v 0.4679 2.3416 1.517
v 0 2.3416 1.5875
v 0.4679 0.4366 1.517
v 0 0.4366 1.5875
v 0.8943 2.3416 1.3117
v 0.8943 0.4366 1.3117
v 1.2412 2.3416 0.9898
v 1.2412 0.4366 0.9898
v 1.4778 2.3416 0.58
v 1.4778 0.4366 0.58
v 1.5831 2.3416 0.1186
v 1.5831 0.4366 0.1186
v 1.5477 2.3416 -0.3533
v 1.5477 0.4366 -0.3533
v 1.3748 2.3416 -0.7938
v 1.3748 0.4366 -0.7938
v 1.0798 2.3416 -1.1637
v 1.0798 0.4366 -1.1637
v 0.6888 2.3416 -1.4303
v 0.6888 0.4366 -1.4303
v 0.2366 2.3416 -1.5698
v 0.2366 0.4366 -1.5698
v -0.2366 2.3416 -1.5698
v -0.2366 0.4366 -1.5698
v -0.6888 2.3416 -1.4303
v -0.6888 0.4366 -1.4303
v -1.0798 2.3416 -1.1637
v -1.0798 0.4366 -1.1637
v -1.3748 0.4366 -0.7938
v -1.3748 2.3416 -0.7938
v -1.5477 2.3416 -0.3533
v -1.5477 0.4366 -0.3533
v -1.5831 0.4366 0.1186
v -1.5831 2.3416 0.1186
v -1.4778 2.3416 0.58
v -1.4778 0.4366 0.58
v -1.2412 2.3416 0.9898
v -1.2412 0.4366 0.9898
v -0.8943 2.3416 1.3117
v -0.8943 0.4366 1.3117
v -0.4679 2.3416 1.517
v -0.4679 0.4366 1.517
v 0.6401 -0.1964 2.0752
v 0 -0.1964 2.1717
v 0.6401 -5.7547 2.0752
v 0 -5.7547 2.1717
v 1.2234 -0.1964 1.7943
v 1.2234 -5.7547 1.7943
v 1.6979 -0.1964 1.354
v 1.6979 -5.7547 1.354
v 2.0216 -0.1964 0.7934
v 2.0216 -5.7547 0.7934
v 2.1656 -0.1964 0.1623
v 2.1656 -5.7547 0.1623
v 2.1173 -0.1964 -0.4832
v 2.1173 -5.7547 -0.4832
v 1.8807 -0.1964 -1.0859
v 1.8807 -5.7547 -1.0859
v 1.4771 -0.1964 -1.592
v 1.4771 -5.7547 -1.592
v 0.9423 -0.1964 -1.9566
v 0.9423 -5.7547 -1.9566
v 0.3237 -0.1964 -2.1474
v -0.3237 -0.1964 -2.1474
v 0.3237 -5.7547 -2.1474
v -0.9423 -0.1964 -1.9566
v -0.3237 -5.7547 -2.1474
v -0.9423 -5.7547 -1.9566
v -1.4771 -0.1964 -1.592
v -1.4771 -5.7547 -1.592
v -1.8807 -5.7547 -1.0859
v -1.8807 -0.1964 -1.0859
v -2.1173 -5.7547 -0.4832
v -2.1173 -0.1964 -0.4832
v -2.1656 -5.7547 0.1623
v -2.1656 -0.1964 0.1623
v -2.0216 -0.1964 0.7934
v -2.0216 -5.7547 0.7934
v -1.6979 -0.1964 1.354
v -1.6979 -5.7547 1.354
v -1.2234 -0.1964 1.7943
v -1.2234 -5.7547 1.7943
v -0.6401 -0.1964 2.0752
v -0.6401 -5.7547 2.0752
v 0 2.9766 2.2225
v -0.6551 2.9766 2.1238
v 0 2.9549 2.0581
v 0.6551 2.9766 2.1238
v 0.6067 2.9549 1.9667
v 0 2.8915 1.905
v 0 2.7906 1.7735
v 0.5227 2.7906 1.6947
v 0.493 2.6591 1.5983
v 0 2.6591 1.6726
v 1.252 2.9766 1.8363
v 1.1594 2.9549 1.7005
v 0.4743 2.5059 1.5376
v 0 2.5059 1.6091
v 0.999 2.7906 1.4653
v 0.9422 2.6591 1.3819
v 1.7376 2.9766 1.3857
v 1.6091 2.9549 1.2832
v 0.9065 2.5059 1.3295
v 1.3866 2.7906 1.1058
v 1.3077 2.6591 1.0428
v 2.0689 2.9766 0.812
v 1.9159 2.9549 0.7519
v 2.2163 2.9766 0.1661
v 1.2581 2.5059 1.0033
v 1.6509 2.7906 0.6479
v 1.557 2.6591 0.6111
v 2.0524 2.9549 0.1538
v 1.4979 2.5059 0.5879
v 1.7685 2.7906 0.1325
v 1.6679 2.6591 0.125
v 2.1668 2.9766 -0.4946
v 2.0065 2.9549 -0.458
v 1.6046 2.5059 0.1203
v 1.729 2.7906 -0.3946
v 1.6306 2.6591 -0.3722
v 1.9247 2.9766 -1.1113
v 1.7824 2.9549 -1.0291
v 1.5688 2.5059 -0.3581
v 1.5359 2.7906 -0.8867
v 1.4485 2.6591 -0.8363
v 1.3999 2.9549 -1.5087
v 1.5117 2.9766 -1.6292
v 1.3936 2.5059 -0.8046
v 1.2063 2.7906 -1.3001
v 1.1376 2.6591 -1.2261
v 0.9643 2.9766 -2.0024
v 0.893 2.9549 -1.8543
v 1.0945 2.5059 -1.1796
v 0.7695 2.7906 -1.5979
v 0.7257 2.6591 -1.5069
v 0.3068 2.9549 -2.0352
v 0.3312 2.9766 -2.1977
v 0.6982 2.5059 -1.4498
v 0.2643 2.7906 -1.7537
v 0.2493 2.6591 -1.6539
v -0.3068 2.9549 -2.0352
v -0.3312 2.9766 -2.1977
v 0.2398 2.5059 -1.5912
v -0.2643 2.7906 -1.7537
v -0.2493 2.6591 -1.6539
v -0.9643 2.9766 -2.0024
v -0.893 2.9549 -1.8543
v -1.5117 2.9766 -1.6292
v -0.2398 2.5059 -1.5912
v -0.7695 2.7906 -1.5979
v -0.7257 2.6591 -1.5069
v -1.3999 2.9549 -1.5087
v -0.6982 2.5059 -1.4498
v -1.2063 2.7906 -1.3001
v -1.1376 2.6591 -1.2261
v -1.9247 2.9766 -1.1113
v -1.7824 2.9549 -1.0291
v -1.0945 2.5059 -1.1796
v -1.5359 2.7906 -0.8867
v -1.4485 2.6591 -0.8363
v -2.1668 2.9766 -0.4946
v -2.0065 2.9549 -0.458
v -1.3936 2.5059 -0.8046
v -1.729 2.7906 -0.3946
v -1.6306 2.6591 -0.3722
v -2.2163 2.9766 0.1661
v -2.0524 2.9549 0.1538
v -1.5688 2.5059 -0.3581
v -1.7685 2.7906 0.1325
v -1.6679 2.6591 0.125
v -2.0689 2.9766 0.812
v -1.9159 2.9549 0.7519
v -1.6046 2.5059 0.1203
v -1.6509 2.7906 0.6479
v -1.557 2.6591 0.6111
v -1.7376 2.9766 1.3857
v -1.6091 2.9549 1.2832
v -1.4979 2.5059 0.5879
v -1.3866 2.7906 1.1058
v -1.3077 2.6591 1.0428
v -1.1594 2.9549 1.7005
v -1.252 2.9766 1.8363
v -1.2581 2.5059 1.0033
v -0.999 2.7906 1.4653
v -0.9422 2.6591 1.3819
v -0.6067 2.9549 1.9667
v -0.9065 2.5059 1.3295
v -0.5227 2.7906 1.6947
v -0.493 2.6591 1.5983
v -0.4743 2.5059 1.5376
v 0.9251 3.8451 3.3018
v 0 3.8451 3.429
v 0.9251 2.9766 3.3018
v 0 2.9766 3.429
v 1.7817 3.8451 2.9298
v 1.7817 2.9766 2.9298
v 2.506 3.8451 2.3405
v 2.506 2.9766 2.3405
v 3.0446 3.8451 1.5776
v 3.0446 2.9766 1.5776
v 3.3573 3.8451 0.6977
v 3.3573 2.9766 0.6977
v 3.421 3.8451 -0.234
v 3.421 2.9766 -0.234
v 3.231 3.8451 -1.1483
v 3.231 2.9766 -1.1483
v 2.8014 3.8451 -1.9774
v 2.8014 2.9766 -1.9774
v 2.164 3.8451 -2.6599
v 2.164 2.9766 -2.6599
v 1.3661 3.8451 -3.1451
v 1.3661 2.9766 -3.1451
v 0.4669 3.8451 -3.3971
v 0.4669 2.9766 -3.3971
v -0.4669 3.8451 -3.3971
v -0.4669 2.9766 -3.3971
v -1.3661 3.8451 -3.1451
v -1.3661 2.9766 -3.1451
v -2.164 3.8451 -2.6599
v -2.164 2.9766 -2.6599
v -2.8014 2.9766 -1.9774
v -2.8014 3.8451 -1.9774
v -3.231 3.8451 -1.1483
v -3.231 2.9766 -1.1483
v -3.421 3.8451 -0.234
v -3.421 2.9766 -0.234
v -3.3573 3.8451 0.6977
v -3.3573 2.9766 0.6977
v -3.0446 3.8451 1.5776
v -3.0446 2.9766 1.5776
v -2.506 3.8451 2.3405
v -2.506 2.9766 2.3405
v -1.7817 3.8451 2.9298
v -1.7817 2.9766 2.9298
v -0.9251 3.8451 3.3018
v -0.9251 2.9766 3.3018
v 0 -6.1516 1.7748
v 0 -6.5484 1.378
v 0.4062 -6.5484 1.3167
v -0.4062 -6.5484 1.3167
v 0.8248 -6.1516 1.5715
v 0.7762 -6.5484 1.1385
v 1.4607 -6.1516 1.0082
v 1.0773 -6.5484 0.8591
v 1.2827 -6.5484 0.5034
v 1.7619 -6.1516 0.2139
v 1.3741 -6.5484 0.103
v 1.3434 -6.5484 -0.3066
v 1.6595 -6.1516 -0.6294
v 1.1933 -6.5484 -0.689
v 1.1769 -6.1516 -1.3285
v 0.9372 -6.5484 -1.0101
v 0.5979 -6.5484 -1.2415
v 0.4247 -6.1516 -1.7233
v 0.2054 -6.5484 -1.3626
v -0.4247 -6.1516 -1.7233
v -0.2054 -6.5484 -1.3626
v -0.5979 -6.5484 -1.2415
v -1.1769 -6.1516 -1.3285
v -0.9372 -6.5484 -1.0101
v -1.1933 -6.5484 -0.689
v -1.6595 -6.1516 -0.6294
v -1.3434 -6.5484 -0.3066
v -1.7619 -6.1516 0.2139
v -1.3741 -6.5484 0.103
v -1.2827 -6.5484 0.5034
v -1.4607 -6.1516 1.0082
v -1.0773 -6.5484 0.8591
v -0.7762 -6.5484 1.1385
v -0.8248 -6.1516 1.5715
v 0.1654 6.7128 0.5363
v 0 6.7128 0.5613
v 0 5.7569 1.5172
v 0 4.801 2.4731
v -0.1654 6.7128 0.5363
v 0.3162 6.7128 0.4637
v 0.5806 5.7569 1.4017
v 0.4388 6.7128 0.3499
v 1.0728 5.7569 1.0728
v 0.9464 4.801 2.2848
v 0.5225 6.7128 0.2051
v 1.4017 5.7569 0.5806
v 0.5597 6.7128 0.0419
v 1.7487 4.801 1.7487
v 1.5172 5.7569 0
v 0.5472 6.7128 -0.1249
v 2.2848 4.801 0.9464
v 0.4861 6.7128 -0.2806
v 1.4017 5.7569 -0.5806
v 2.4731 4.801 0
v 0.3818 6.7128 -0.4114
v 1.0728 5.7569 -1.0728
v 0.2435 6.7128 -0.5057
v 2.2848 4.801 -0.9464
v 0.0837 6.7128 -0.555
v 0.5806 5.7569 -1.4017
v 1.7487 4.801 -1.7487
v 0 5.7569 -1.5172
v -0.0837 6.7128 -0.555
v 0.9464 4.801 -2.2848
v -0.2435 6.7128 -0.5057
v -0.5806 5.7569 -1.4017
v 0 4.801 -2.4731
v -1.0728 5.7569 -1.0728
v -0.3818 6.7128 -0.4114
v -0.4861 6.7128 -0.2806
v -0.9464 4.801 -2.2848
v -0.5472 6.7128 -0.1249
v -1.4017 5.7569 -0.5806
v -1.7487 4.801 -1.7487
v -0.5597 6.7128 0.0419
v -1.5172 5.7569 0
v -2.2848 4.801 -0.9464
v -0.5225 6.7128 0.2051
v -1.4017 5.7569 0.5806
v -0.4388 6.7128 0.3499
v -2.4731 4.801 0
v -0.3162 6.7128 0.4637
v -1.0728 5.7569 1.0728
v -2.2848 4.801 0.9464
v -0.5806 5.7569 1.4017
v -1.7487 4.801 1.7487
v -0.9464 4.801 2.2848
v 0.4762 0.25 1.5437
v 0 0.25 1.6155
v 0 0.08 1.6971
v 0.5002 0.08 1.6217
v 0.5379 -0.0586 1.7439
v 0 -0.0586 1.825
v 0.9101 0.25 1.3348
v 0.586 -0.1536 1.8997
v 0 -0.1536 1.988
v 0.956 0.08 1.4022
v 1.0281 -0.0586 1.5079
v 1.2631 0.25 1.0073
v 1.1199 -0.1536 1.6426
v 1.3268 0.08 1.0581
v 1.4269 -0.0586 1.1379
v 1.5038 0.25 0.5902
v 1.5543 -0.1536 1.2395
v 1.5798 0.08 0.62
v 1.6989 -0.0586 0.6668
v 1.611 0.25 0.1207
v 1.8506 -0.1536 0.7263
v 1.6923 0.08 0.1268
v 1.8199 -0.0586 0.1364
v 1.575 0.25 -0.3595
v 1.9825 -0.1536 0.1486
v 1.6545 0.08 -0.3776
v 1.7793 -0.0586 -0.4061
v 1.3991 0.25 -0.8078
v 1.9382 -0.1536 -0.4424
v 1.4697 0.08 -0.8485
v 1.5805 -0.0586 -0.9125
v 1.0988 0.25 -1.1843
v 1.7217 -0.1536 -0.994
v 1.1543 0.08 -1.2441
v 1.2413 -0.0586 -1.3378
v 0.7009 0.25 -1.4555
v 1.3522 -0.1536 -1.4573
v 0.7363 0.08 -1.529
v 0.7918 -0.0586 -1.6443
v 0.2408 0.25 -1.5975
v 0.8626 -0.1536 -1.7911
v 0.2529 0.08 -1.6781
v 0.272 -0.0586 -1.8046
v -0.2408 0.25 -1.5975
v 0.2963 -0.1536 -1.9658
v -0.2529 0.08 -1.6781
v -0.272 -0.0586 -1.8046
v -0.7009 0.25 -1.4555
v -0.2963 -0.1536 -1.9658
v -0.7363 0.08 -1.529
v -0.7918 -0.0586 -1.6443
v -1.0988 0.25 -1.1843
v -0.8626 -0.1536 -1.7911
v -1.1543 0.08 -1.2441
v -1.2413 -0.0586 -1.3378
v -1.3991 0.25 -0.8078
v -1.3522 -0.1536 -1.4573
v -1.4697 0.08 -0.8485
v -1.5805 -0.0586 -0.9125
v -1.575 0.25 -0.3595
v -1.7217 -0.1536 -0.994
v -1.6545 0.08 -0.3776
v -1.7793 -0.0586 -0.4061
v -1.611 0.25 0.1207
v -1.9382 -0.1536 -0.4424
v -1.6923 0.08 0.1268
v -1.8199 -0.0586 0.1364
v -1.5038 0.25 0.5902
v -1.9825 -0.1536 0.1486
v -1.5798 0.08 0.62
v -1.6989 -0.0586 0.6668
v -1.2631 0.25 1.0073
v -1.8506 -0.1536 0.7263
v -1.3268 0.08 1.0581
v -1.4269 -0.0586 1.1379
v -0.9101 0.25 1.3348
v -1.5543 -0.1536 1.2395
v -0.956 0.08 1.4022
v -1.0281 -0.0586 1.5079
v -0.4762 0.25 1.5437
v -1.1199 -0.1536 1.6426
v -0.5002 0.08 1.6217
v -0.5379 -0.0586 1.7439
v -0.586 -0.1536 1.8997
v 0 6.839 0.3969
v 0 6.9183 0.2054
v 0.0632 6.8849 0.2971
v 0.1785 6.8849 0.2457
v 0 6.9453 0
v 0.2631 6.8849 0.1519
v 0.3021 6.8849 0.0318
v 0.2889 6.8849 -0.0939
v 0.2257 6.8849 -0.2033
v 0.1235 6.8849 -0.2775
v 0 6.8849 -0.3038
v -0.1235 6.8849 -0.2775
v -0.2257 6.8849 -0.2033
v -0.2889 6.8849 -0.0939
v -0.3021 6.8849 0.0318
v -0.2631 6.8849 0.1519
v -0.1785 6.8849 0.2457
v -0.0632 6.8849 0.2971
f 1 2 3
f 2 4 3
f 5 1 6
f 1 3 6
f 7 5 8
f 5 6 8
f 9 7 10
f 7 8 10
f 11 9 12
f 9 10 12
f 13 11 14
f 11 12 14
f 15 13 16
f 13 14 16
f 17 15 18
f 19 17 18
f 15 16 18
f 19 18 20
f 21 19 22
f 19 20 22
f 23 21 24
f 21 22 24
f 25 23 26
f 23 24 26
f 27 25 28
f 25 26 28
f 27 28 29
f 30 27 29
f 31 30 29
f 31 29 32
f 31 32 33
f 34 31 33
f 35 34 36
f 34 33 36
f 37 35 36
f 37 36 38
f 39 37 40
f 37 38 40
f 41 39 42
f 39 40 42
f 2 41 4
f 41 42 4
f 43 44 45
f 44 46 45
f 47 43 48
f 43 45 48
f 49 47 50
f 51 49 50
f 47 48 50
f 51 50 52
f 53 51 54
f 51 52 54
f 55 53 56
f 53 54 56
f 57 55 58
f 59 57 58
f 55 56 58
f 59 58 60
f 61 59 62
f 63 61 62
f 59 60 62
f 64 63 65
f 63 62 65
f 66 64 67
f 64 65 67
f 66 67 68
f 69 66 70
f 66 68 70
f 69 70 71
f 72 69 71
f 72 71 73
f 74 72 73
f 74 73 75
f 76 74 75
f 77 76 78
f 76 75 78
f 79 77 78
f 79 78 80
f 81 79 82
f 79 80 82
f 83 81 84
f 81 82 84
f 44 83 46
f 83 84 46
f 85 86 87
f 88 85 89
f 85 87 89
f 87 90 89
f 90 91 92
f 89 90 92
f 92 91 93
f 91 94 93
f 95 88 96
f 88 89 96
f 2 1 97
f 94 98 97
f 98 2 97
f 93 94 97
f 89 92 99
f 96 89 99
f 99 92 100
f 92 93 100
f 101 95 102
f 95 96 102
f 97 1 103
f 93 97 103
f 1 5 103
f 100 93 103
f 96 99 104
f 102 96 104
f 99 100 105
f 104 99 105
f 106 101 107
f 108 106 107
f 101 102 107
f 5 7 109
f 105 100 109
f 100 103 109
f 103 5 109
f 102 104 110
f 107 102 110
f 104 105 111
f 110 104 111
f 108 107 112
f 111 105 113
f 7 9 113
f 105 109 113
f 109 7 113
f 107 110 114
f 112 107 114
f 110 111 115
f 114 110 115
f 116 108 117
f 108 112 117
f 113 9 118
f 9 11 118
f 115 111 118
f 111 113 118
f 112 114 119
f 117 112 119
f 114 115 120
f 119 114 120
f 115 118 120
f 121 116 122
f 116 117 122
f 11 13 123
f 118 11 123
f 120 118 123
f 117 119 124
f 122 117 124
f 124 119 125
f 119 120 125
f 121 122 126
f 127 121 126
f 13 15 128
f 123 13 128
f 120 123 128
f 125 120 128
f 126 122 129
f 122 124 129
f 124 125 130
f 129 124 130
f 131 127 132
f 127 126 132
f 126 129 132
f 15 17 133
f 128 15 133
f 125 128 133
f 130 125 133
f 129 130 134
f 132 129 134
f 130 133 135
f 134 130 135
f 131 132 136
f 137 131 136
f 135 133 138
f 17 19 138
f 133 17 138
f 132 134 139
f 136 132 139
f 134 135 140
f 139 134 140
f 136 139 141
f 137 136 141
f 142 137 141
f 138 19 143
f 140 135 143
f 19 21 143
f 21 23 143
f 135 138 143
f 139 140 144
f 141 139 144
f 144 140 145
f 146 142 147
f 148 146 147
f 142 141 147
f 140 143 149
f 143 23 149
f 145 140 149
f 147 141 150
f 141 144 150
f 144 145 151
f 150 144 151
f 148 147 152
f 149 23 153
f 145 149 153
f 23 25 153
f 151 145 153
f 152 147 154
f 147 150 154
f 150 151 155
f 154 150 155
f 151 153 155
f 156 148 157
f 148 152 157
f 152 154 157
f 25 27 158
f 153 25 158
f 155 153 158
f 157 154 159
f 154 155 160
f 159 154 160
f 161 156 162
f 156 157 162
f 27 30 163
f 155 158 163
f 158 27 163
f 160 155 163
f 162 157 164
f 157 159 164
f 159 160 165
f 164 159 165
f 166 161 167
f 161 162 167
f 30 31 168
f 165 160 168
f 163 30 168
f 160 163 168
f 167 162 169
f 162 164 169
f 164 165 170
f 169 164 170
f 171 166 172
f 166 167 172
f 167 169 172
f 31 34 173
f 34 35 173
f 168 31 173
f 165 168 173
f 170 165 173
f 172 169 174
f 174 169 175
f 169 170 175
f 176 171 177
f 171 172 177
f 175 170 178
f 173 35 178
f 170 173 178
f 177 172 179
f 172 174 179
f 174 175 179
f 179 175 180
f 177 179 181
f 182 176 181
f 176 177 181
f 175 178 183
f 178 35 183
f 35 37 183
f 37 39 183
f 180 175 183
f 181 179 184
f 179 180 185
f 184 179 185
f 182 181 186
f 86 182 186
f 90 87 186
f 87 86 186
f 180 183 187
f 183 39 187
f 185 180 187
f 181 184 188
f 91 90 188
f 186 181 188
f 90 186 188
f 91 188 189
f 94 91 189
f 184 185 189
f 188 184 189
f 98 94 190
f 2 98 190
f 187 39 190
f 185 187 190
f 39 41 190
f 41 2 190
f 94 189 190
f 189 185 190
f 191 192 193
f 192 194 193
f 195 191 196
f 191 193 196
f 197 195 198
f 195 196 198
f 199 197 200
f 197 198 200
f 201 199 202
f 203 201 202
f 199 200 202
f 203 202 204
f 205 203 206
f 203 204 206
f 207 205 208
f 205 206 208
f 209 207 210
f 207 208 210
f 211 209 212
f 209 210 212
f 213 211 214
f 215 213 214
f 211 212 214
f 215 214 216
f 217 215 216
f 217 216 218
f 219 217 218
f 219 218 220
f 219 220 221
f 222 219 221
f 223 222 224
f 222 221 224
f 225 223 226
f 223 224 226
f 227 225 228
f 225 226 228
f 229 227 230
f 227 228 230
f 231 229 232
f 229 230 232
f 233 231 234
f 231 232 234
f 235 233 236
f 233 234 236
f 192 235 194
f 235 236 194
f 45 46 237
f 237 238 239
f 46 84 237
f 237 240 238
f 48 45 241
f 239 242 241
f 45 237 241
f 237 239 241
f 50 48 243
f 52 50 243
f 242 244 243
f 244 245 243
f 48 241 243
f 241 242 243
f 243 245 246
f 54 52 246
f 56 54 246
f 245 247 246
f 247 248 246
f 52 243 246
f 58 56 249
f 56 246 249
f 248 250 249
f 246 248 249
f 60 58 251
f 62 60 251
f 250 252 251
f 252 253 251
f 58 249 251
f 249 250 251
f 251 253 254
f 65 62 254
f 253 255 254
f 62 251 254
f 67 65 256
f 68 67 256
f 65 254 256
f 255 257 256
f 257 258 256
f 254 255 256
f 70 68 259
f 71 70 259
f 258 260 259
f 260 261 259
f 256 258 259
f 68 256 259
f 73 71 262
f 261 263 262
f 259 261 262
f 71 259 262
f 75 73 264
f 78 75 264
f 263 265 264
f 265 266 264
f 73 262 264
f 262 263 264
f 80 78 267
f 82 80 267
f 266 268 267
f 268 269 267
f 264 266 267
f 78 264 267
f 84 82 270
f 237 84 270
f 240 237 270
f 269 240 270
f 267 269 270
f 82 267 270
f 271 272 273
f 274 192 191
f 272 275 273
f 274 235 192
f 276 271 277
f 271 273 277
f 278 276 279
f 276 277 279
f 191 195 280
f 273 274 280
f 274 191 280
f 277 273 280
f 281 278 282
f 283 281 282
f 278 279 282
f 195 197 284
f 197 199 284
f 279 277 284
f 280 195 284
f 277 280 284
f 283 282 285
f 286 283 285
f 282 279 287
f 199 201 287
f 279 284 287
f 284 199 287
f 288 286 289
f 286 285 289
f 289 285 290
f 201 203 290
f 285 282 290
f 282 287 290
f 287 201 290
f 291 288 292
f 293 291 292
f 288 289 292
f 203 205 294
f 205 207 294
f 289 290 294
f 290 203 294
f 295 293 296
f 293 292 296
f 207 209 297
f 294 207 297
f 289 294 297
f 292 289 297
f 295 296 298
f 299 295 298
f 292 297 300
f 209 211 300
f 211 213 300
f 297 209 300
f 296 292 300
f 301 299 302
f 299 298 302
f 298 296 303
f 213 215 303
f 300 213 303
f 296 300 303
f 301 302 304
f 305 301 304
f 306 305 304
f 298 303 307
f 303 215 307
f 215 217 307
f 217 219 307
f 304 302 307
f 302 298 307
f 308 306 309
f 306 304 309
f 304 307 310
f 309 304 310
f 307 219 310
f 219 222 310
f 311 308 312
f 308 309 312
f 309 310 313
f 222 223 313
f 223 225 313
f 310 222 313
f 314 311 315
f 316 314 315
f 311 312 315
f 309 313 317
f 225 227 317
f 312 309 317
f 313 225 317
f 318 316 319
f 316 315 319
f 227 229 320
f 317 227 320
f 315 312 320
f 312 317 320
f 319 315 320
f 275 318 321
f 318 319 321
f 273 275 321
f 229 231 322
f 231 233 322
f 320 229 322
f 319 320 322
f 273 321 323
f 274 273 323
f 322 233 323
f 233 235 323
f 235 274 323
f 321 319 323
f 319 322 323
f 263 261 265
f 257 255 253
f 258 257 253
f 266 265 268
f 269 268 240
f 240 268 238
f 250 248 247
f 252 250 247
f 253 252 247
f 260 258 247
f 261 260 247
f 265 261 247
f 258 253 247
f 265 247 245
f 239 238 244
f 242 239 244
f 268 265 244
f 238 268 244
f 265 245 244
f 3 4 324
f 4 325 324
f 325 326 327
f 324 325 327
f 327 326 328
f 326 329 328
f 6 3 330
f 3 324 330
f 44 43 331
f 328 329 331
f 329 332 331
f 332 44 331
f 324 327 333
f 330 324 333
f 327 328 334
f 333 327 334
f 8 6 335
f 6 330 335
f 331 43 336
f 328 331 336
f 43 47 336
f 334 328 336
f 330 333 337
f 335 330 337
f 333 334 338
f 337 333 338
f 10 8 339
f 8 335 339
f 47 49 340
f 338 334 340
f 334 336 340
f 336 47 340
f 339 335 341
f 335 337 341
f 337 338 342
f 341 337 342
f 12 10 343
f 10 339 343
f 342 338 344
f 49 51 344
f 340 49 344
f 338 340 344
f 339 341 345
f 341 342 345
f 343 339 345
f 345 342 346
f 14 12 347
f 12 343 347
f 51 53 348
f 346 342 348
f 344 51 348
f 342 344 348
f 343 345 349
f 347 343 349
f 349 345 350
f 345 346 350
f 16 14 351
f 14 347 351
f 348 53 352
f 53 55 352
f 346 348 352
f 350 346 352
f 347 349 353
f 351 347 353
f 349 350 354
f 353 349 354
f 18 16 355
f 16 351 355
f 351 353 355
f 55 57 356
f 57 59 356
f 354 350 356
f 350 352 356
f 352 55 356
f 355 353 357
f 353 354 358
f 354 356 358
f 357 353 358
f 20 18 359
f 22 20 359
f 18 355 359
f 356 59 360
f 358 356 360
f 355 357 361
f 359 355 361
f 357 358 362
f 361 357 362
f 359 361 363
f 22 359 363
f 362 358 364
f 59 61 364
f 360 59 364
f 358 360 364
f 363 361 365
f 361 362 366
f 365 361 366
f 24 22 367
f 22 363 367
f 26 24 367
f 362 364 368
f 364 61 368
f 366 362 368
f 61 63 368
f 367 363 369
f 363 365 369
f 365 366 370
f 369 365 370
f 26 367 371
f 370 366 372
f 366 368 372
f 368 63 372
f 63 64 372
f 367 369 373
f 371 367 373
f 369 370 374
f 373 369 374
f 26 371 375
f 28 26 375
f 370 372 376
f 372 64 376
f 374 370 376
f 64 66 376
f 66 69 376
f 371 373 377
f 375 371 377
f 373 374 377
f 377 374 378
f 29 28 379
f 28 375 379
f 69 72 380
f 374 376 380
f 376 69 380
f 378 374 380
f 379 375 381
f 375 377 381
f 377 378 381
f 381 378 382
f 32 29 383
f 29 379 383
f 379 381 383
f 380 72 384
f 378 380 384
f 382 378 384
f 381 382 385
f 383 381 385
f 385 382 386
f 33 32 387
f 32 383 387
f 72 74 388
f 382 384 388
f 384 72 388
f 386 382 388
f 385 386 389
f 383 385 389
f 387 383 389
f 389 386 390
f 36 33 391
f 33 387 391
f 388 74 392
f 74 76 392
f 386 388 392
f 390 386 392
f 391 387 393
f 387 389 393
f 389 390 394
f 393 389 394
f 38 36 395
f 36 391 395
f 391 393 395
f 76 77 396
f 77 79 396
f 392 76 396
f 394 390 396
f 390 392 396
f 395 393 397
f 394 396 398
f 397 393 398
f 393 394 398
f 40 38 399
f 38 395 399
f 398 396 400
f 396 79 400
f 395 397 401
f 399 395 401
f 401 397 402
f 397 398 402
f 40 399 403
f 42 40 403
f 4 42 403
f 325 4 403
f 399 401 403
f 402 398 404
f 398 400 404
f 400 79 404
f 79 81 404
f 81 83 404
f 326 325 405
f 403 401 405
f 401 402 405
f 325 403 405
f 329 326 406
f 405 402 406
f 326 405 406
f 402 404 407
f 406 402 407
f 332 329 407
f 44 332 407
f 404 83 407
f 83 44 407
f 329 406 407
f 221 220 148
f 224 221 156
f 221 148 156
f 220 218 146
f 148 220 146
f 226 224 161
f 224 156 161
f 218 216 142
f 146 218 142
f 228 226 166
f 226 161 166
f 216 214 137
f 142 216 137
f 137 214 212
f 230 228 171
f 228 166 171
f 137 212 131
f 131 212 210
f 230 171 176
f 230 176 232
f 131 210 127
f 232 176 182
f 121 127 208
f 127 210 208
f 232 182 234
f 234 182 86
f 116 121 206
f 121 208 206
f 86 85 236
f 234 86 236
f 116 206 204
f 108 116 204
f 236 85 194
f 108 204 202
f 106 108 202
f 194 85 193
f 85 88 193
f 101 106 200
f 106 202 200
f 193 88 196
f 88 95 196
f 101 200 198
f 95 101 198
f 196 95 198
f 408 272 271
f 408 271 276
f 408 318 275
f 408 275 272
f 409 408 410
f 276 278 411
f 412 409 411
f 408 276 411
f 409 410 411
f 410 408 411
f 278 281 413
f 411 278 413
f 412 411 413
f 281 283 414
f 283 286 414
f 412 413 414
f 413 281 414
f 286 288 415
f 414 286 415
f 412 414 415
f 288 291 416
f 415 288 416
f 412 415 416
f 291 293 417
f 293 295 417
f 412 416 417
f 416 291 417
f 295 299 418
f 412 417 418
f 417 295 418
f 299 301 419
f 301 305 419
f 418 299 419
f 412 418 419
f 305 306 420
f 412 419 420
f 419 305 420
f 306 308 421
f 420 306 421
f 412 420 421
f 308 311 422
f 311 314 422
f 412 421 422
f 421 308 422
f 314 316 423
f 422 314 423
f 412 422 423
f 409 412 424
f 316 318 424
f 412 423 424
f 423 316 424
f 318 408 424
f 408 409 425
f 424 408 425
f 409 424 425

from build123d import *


with BuildPart() as f1:
    # F0 (on Right) → F1 (revolve)
    with BuildSketch(Plane.YZ):
        with BuildLine():
            Line((3.8450945151, 3.429), (2.9765625, 3.429))
            Line((2.9765625, 3.429), (2.9765625, 2.2225))
            ThreePointArc((2.9765625, 2.2225), (2.7905753061, 1.7734871939), (2.3415625, 1.5875))
            Line((2.3415625, 1.5875), (0.4365625, 1.5875))
            ThreePointArc((0.4365625, 1.5875), (0.0058845461, 1.755872204), (-0.1964022384, 2.1717))
            Line((-0.1964022384, 2.1717), (-5.7546875, 2.1717))
            Line((-5.7546875, 2.1717), (-6.5484375, 1.37795))
            Line((-6.5484375, 1.37795), (-6.5484375, 0))
            Line((-6.5484375, 0), (6.5484375, 0))
            Line((6.5484375, 0), (6.9453125, 0))
            ThreePointArc((6.9453125, 0), (6.8848918789, 0.3037549744), (6.7128285076, 0.5612660076))
            Line((6.7128285076, 0.5612660076), (3.8450945151, 3.429))
        make_face()
    revolve(axis=Axis((0, 0.1984375, 0), (0, 1, 0)))


solid = f1.part
